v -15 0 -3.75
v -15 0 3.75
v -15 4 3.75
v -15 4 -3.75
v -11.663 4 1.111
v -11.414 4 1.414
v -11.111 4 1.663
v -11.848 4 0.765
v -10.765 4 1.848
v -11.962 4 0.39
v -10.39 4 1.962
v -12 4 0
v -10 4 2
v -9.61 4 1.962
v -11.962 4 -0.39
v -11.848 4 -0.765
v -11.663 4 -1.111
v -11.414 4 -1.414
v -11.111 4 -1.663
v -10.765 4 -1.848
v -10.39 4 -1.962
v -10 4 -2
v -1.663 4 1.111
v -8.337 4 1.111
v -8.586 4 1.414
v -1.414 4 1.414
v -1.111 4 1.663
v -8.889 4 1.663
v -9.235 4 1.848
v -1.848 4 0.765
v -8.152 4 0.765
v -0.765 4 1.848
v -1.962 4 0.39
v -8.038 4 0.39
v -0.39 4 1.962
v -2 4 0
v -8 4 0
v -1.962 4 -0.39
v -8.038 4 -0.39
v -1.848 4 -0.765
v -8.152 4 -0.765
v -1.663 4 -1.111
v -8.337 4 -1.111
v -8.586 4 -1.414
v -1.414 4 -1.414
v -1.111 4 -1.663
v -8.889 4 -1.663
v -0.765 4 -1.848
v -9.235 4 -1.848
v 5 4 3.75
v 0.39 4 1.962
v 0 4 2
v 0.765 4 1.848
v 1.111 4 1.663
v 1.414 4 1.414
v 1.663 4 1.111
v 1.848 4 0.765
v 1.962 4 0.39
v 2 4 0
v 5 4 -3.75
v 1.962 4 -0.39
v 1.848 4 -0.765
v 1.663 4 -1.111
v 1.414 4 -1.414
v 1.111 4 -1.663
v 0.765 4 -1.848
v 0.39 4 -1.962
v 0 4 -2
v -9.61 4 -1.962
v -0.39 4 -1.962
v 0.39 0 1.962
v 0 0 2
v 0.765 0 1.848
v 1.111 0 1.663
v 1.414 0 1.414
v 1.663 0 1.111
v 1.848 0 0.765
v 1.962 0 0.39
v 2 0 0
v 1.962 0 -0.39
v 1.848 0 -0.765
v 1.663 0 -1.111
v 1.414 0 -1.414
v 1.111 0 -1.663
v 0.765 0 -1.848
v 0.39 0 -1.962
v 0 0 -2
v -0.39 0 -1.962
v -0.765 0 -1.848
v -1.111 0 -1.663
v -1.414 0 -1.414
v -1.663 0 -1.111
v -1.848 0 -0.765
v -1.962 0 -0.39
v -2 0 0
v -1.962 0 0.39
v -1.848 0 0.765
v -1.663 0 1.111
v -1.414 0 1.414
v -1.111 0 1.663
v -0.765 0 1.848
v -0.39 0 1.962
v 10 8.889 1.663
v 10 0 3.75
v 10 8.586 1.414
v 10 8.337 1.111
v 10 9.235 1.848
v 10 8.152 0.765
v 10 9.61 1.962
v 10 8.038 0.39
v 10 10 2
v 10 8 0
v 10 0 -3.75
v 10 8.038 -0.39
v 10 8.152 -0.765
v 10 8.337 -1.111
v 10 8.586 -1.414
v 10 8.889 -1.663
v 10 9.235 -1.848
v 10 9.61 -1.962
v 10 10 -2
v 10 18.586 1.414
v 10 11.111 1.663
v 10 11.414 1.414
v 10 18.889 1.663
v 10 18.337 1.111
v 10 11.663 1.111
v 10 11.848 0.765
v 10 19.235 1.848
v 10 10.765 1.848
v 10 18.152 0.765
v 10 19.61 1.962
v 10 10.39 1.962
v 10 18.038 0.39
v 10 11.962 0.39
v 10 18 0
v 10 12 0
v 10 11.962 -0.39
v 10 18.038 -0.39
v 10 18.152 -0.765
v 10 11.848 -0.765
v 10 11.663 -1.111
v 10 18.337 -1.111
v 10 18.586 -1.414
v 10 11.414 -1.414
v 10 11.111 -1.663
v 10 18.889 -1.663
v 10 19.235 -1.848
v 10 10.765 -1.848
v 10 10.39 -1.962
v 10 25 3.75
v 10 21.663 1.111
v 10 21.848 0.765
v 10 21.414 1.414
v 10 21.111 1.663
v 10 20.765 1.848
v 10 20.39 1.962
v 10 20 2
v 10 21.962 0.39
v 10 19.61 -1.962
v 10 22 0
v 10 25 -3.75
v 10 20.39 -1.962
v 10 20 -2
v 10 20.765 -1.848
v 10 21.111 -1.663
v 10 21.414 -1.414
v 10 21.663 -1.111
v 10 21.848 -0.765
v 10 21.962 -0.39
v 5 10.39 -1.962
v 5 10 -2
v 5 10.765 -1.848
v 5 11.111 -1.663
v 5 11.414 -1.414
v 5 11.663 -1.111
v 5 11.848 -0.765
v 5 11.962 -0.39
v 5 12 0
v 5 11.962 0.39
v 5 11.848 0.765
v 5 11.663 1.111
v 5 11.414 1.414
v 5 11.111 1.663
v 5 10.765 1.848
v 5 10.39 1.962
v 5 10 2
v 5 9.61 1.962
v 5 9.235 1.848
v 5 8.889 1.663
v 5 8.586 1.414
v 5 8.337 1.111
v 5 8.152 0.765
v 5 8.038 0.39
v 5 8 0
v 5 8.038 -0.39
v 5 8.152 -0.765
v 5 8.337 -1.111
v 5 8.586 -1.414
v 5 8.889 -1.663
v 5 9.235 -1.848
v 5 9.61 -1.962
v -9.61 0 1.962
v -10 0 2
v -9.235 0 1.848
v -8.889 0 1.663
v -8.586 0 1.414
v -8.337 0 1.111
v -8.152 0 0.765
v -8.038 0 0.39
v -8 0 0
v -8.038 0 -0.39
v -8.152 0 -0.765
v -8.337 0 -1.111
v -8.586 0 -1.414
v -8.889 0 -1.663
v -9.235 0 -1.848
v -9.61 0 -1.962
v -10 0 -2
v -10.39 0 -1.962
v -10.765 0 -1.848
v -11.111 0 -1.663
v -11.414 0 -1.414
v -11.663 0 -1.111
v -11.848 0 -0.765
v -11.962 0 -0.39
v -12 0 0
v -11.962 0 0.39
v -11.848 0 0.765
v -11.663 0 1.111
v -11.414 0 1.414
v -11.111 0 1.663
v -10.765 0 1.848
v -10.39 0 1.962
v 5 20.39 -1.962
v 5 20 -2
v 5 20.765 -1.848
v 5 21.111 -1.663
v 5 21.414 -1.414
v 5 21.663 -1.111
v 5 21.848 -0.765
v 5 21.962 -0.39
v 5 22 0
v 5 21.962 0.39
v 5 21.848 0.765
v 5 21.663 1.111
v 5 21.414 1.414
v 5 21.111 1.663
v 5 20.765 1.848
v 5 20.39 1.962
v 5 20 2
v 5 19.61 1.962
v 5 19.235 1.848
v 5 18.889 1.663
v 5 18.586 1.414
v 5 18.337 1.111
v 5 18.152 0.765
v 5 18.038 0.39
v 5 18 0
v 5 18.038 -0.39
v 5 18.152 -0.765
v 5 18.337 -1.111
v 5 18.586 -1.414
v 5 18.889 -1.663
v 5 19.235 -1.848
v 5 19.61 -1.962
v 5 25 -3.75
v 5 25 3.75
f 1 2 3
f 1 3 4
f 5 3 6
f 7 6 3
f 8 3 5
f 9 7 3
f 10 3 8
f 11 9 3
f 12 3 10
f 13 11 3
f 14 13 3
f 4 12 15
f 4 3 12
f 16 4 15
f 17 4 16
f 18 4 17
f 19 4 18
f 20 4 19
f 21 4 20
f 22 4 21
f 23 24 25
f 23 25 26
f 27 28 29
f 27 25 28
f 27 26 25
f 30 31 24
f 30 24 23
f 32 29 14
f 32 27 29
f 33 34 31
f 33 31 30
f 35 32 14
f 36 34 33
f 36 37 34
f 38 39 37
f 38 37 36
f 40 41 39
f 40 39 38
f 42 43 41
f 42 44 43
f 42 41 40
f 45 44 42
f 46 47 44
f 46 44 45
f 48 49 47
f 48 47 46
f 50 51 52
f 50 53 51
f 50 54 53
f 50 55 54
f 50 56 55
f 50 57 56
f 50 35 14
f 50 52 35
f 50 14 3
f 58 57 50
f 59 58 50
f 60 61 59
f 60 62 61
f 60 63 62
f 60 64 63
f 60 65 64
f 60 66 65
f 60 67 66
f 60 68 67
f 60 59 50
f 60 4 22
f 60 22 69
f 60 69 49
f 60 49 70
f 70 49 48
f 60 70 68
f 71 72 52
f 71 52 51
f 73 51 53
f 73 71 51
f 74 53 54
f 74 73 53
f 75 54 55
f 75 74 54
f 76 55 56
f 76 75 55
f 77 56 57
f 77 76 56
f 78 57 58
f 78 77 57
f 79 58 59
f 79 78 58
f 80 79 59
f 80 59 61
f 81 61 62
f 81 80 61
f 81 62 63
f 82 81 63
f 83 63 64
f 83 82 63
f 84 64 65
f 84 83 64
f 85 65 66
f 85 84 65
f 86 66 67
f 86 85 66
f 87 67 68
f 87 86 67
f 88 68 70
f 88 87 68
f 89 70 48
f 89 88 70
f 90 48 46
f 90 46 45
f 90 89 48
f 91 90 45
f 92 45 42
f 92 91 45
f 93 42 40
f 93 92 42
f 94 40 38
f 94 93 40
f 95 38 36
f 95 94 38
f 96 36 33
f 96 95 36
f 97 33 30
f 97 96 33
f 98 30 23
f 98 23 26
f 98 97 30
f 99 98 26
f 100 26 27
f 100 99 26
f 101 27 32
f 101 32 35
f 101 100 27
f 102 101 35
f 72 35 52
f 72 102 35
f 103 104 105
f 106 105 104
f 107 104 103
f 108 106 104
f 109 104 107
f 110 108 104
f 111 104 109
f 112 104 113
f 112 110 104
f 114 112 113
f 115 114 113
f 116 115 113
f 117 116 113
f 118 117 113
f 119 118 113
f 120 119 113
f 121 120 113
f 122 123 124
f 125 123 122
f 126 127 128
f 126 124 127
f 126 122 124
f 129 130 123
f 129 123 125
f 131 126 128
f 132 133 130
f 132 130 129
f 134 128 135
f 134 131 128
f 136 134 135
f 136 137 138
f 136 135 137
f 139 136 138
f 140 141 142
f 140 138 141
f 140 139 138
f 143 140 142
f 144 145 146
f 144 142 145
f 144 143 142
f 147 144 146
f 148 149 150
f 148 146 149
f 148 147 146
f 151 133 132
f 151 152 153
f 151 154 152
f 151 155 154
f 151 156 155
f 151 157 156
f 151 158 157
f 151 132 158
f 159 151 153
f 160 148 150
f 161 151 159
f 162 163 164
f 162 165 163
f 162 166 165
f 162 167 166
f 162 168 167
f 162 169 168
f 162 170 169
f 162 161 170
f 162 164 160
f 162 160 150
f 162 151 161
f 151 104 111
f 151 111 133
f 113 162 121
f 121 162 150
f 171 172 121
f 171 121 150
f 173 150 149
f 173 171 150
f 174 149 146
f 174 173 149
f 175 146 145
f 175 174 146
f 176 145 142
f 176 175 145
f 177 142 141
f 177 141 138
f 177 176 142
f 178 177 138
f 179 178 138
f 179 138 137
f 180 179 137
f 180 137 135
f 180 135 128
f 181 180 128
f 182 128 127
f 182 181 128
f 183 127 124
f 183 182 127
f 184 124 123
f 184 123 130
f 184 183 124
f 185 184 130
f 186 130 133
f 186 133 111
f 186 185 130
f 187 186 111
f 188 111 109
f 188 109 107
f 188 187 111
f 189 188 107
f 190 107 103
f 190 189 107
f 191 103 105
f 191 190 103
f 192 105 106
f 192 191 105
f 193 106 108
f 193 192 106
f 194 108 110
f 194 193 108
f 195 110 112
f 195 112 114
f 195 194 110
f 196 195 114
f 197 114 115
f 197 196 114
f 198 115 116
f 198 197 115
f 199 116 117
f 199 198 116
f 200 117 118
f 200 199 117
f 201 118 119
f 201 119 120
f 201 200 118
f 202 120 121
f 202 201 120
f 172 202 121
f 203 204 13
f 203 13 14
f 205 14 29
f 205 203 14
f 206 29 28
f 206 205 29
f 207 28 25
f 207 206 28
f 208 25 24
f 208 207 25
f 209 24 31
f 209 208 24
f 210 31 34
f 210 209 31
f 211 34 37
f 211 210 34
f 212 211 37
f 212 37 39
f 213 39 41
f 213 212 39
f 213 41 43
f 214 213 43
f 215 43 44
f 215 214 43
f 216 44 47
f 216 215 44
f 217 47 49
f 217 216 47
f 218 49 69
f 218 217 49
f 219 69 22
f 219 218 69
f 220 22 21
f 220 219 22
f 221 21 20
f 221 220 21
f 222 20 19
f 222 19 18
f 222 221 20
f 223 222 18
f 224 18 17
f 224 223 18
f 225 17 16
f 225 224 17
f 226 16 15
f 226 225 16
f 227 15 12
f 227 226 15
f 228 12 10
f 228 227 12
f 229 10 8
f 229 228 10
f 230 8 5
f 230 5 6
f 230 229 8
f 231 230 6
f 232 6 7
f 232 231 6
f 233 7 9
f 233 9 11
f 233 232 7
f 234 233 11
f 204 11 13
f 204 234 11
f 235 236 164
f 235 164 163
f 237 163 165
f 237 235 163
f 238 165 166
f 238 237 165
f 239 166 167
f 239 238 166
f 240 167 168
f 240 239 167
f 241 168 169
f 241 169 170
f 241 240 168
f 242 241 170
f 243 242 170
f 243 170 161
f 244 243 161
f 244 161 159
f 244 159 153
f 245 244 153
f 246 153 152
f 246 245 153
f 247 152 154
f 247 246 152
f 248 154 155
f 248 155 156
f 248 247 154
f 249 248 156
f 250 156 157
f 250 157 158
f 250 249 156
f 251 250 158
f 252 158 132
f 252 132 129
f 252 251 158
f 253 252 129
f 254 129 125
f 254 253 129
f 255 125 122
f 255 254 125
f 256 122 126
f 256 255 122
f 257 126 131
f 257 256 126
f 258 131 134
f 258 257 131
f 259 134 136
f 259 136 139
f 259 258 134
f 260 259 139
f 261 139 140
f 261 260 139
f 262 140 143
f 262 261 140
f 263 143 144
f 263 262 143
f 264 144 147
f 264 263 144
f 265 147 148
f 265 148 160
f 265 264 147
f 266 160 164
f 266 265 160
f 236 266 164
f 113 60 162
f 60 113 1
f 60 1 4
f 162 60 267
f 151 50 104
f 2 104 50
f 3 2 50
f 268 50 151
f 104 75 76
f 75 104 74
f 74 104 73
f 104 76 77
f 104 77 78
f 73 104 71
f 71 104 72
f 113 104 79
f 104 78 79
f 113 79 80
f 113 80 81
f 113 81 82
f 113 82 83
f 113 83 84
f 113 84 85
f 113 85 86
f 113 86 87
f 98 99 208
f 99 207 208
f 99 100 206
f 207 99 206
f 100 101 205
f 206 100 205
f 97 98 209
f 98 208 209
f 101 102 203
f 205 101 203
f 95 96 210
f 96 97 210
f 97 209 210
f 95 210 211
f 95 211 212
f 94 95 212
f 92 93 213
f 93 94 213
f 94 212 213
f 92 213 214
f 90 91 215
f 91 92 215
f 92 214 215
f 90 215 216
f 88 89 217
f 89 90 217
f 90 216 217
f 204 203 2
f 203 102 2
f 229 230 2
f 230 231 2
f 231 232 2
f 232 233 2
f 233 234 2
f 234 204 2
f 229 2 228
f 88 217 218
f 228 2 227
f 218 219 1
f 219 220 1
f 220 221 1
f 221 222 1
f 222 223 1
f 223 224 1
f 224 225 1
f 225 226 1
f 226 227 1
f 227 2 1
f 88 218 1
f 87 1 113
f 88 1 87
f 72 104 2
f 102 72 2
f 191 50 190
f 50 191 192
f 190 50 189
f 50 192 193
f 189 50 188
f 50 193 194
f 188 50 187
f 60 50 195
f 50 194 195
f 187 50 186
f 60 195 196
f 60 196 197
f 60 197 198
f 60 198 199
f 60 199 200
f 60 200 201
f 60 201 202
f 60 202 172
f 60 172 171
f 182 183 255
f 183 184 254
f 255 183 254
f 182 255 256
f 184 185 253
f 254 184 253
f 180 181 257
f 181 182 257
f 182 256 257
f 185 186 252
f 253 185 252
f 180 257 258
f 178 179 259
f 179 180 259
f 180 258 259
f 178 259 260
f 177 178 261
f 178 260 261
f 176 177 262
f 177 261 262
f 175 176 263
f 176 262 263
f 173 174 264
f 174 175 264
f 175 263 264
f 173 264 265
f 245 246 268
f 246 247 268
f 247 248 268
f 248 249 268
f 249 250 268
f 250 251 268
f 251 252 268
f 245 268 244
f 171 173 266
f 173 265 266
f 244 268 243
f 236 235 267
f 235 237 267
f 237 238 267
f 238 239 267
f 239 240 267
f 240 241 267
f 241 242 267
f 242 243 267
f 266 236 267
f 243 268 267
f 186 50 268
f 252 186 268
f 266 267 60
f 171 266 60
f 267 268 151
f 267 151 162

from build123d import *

# Parameters (mm, degrees)
SKETCH1_W           = 20
SKETCH1_H           = 7.5
SKETCH1_R           = 2
BOSS_EXTRUDE1_DEPTH = 4
SKETCH2_W           = 7.5
SKETCH2_H           = 25
SKETCH2_R           = 2
BOSS_EXTRUDE2_DEPTH = 5


with BuildPart() as part:
    # Sketch1 → Boss-Extrude1 (new body)
    with BuildSketch(Plane(origin=(0, 0, 0), x_dir=(1, 0, 0), z_dir=(0, 1, 0))):
        with Locations((-5, 0)):
            Rectangle(SKETCH1_W, SKETCH1_H)
        with Locations(Location((0, 0, 0), (0, 0, 270))):
            Circle(SKETCH1_R, mode=Mode.SUBTRACT)
        with Locations(Location((-10, 0, 0), (0, 0, 270))):
            Circle(SKETCH1_R, mode=Mode.SUBTRACT)
    extrude(amount=BOSS_EXTRUDE1_DEPTH)

    # Sketch2 → Boss-Extrude2 (add)
    with BuildSketch(Plane(origin=(5, 0, 0), x_dir=(0, 0, -1), z_dir=(1, 0, 0))):
        with Locations((0, 12.5)):
            Rectangle(SKETCH2_W, SKETCH2_H)
        with Locations((0, 20)):
            Circle(SKETCH2_R, mode=Mode.SUBTRACT)
        with Locations((0, 10)):
            Circle(SKETCH2_R, mode=Mode.SUBTRACT)
    extrude(amount=BOSS_EXTRUDE2_DEPTH)


solid = part.part
